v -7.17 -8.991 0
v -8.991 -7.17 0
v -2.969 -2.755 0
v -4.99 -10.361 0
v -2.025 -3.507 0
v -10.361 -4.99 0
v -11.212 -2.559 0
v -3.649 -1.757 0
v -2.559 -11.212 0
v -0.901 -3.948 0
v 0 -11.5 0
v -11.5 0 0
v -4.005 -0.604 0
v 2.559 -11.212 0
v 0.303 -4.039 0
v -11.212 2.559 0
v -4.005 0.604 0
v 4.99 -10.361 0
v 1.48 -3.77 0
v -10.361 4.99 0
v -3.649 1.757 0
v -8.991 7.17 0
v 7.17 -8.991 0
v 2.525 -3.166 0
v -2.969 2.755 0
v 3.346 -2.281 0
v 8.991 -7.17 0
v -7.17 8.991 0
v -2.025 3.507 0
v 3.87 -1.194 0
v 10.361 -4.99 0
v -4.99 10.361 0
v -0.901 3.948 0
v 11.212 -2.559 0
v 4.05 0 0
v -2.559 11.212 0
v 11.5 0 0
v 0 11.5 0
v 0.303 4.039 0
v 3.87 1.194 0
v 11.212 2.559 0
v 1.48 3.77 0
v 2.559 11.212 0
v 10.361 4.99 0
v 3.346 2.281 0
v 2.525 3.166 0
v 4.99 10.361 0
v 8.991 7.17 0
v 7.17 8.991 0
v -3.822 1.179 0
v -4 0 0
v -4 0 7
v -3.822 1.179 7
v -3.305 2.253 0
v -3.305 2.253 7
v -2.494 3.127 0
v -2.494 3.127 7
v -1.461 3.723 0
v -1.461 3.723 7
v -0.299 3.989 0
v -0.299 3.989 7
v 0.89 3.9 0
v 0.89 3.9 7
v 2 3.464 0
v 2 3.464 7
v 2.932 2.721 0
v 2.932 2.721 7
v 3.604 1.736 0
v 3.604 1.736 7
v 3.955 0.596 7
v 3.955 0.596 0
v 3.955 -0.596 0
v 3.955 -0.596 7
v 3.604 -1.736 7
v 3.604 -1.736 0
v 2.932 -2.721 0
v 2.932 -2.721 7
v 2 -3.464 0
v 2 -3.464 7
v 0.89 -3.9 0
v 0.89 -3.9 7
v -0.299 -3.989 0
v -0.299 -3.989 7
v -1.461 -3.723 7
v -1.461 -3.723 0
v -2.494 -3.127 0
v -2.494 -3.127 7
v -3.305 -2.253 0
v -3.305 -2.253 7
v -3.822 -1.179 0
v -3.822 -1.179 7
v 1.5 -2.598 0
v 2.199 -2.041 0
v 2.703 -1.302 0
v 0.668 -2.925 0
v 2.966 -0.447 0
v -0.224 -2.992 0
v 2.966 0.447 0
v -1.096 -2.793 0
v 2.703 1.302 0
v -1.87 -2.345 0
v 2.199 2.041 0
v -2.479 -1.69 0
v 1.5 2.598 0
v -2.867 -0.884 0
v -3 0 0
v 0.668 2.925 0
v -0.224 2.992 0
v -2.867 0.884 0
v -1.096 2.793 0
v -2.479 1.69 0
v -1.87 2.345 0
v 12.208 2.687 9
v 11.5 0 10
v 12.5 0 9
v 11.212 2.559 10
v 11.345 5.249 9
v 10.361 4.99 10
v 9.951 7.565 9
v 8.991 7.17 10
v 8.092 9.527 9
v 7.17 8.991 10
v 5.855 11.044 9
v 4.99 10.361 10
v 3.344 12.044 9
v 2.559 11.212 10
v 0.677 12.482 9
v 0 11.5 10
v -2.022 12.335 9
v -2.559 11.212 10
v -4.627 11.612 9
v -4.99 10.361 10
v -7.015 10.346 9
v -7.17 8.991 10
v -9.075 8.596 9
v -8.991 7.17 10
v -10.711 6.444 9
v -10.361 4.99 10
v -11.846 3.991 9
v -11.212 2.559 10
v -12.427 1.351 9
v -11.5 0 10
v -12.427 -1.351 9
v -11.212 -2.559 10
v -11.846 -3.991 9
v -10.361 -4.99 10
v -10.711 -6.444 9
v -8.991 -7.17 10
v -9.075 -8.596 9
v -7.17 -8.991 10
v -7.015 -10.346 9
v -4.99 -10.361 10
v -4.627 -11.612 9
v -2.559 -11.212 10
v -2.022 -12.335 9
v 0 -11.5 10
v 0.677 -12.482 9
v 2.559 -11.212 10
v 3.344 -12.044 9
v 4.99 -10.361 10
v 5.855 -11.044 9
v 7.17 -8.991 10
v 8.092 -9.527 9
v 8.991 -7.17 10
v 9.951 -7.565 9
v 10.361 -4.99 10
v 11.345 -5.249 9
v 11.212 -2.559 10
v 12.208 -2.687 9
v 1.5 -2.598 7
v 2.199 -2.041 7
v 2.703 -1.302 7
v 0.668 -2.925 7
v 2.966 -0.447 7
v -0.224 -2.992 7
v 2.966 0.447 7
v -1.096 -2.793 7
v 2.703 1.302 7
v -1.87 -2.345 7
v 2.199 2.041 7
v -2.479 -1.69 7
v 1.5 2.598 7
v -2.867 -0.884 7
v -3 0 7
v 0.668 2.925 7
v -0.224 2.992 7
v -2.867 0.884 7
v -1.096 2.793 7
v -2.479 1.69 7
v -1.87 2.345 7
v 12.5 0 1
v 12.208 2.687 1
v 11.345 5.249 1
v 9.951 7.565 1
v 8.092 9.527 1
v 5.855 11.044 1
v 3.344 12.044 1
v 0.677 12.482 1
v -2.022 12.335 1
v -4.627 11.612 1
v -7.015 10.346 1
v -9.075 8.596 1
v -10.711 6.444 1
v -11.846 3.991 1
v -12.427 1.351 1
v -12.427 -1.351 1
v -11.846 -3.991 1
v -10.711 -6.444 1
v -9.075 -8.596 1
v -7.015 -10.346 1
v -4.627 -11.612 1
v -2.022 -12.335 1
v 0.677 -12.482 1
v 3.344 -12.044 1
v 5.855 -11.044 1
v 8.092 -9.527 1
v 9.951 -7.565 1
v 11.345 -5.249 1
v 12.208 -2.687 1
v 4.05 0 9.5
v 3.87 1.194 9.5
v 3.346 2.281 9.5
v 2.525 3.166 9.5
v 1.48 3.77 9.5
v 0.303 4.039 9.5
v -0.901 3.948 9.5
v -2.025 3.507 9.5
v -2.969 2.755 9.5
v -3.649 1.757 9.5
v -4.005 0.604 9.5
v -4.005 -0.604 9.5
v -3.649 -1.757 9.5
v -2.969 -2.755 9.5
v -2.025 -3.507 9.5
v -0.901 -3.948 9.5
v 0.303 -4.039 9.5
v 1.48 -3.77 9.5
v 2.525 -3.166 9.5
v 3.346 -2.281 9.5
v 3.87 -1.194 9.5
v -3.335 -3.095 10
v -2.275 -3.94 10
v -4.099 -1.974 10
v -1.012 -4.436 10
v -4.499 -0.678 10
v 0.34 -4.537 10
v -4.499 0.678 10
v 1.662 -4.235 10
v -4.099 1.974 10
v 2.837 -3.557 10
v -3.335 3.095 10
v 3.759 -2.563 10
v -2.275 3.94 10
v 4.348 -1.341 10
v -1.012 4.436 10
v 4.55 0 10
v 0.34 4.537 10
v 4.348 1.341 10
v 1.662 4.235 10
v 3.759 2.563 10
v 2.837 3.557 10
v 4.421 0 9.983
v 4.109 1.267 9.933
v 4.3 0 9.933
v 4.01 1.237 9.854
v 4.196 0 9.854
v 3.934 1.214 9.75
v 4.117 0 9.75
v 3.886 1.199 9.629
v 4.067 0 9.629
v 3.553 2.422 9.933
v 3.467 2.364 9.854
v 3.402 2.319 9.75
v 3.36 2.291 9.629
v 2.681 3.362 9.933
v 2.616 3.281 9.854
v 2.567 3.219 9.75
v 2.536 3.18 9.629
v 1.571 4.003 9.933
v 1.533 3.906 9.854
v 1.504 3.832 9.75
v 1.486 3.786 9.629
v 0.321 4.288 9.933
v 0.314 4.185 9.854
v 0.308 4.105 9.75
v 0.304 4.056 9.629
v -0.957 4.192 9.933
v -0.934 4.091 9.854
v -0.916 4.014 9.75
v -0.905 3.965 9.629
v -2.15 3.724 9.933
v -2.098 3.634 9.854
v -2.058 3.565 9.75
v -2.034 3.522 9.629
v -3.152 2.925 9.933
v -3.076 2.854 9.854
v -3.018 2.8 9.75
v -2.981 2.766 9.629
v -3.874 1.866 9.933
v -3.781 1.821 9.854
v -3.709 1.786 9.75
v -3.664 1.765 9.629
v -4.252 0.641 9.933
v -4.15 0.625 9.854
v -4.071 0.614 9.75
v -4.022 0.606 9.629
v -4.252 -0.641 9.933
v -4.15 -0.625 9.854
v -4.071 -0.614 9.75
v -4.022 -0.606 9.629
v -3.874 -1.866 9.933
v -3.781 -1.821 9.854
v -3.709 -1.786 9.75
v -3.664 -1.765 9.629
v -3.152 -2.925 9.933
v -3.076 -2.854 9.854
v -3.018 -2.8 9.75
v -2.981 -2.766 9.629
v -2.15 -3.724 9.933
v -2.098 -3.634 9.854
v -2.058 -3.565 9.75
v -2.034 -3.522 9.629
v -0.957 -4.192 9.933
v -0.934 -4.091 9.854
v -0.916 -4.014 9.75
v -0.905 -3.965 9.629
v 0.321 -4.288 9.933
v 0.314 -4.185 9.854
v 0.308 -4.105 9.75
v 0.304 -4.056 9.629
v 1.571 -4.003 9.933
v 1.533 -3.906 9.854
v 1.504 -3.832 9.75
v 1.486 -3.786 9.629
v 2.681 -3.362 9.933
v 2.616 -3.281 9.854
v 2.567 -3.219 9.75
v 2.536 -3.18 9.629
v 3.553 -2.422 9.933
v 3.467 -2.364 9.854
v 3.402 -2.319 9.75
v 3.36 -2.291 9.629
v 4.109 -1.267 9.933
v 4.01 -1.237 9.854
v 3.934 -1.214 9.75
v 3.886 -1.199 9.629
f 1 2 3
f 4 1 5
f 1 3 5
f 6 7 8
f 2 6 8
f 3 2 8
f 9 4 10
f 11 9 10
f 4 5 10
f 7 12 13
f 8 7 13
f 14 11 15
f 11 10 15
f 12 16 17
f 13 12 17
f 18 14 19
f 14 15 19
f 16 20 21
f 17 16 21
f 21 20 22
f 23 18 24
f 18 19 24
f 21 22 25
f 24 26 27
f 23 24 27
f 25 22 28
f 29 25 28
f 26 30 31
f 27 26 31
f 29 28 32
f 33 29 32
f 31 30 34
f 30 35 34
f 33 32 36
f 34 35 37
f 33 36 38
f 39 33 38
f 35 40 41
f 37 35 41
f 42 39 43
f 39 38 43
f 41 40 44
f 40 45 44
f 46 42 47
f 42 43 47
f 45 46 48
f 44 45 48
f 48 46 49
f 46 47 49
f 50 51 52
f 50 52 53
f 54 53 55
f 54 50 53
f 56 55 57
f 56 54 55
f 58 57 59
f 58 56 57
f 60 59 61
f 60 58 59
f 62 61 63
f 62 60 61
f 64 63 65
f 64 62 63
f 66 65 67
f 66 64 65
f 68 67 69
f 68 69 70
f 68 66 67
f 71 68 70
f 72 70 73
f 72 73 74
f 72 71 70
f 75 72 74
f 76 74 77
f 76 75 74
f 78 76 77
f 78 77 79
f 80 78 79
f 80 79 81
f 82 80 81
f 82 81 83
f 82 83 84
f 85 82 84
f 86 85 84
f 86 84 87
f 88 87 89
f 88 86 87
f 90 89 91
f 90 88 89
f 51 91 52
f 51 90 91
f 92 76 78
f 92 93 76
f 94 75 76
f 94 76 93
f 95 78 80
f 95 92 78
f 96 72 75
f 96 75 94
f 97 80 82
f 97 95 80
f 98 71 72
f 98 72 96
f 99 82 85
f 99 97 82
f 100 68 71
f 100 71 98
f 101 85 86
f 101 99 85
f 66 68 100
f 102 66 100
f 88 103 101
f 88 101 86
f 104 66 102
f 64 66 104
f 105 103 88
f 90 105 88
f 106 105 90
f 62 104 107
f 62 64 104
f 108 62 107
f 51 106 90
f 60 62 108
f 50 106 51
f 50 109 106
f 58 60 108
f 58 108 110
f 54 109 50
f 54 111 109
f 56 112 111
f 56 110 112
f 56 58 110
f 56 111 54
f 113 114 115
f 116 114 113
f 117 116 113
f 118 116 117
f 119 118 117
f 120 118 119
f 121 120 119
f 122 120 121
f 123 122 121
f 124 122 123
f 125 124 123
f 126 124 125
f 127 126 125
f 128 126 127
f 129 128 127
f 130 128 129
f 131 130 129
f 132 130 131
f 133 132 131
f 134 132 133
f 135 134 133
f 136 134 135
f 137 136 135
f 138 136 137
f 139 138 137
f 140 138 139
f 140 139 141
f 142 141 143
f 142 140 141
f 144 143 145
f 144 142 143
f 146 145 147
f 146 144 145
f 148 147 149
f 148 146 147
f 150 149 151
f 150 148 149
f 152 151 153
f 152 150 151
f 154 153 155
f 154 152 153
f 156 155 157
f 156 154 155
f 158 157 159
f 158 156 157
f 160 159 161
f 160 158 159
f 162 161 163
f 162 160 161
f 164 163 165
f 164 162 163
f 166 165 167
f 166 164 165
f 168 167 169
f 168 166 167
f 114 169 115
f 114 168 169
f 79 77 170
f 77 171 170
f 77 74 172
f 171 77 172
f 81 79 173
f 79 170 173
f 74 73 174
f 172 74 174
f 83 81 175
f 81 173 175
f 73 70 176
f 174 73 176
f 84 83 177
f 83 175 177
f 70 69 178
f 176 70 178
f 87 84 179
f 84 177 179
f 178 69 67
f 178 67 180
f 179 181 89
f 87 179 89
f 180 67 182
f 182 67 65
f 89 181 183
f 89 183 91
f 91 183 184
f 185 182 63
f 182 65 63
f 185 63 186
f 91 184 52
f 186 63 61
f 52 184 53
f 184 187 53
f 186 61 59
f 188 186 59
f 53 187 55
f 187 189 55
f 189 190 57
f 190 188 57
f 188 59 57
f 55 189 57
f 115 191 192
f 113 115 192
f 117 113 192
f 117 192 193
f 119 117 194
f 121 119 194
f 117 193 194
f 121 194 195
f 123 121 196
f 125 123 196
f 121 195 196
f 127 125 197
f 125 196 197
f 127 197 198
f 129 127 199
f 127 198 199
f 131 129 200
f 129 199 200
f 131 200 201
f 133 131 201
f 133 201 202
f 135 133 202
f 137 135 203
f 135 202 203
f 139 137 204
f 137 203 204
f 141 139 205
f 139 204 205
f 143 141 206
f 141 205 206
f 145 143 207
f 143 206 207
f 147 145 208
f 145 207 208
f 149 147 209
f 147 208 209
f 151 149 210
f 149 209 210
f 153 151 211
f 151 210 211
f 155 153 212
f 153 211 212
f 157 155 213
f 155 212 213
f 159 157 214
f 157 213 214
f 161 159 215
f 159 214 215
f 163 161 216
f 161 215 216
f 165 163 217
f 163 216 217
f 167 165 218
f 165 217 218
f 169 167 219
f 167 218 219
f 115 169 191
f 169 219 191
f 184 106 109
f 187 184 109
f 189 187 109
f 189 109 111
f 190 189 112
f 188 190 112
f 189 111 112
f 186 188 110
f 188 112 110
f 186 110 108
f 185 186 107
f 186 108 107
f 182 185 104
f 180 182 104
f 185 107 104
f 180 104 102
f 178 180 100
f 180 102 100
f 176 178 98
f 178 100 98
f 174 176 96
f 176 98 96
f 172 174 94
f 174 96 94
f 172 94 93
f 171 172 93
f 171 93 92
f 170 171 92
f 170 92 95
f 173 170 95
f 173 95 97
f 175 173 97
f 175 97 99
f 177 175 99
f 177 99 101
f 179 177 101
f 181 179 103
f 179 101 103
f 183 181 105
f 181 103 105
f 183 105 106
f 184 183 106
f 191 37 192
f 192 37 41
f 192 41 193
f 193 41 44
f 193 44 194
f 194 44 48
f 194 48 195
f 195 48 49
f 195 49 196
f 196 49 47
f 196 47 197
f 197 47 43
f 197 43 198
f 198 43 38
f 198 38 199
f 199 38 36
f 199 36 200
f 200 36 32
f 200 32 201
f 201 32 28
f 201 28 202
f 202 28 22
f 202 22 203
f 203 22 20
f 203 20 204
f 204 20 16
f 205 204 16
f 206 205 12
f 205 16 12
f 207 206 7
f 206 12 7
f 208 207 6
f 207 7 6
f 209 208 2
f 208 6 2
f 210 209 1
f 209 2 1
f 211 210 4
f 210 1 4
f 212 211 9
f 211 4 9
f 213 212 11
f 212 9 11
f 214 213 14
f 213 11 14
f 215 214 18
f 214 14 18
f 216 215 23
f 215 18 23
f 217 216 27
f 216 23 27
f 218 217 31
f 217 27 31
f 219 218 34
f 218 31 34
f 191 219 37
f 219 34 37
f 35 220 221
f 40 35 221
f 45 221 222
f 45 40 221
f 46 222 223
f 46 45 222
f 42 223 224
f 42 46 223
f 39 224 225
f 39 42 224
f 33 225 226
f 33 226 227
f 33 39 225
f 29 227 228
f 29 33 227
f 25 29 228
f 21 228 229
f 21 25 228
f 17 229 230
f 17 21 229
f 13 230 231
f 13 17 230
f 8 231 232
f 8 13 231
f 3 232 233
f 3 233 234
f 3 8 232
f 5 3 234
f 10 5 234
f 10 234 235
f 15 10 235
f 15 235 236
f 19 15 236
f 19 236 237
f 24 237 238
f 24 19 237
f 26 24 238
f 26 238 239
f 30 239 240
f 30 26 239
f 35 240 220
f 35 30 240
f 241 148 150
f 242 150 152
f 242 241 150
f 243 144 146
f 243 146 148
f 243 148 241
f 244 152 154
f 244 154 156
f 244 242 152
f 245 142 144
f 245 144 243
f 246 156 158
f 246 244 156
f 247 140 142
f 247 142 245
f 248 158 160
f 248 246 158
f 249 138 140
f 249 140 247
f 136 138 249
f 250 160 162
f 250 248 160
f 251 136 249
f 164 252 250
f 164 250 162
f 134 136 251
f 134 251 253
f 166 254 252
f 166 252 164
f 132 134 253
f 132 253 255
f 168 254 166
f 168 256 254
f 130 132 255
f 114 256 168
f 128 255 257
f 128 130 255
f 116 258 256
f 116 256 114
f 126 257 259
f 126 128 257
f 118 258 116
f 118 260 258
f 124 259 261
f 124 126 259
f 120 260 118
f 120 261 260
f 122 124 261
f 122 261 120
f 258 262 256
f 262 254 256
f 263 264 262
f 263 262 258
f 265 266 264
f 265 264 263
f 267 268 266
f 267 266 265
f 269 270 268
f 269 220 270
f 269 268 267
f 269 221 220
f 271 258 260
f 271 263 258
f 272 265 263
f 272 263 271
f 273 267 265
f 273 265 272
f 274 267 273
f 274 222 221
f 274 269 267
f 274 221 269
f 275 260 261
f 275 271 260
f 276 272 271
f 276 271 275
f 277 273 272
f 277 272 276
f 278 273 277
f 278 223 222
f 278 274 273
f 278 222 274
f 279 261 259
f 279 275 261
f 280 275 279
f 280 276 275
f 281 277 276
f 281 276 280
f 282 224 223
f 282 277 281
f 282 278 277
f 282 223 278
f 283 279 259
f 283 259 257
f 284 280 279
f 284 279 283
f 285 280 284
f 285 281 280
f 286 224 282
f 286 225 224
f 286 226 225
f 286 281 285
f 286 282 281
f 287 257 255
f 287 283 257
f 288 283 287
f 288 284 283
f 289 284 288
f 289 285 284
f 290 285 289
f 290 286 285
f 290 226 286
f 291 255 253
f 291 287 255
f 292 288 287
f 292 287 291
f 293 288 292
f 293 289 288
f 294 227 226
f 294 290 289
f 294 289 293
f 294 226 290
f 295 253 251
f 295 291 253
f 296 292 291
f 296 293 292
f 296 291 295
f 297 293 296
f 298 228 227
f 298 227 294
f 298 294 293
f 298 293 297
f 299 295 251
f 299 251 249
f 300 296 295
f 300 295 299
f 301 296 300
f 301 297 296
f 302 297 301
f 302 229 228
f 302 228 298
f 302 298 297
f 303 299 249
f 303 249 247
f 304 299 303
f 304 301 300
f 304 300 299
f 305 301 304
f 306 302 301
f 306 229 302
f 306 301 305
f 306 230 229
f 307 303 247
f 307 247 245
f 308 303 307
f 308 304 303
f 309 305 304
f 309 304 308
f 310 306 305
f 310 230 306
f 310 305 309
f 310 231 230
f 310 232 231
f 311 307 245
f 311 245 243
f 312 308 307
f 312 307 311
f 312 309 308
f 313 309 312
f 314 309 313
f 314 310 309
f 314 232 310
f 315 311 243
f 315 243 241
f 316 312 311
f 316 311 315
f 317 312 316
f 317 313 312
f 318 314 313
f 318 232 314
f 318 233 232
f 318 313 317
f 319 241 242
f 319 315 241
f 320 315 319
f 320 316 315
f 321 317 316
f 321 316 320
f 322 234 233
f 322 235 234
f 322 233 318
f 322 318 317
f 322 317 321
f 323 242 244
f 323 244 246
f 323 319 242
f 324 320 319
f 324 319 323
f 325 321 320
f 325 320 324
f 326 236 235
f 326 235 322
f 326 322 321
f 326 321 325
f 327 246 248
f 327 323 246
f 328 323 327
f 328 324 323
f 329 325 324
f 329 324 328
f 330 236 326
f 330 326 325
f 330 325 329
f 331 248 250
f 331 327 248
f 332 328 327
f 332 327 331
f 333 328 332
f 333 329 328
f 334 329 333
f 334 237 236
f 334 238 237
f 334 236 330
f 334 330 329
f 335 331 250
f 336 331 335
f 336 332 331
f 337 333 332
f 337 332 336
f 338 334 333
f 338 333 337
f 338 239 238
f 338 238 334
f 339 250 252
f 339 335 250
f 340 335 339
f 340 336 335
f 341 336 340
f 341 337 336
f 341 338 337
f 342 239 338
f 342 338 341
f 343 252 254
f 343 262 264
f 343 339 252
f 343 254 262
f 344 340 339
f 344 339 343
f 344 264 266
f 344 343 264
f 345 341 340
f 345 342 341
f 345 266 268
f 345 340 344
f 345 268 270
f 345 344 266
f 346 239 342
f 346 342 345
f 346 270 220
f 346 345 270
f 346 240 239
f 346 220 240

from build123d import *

# Parameters (mm, degrees)
SKETCH_1_R      = 12.5
SKETCH_1_R_2    = 4.05
EXTRUDE_1_DEPTH = 10
SKETCH_2_R      = 4
SKETCH_2_R_2    = 3
EXTRUDE_2_DEPTH = 7
CHAMFER_1_SIZE  = 1
FILLET_1_R      = 0.5


with BuildPart() as part:
    # 草图1 → 凸台-拉伸1 (new body)
    with BuildSketch(Plane.XY):
        Circle(SKETCH_1_R)
        Circle(SKETCH_1_R_2, mode=Mode.SUBTRACT)
    extrude(amount=EXTRUDE_1_DEPTH)

    # 倒角1
    chamfer_1_edges = [part.edges().sort_by_distance(p)[0] for p in [
        (-12.5, 0, 0),
        (-12.5, 0, 10),
    ]]
    chamfer(chamfer_1_edges, length=CHAMFER_1_SIZE)

    # 圆角1
    fillet_1_edges = [part.edges().sort_by_distance(p)[0] for p in [
        (-4.05, 0, 10),
    ]]
    fillet(fillet_1_edges, radius=FILLET_1_R)


with BuildPart() as body_2:
    # 草图2 → 凸台-拉伸2 (new body)
    with BuildSketch(Plane(origin=(0, 0, 0), x_dir=(-1, 0, 0), z_dir=(0, 0, -1))):
        Circle(SKETCH_2_R)
        Circle(SKETCH_2_R_2, mode=Mode.SUBTRACT)
    extrude(amount=-EXTRUDE_2_DEPTH)


solid = Compound([part.part, body_2.part])
